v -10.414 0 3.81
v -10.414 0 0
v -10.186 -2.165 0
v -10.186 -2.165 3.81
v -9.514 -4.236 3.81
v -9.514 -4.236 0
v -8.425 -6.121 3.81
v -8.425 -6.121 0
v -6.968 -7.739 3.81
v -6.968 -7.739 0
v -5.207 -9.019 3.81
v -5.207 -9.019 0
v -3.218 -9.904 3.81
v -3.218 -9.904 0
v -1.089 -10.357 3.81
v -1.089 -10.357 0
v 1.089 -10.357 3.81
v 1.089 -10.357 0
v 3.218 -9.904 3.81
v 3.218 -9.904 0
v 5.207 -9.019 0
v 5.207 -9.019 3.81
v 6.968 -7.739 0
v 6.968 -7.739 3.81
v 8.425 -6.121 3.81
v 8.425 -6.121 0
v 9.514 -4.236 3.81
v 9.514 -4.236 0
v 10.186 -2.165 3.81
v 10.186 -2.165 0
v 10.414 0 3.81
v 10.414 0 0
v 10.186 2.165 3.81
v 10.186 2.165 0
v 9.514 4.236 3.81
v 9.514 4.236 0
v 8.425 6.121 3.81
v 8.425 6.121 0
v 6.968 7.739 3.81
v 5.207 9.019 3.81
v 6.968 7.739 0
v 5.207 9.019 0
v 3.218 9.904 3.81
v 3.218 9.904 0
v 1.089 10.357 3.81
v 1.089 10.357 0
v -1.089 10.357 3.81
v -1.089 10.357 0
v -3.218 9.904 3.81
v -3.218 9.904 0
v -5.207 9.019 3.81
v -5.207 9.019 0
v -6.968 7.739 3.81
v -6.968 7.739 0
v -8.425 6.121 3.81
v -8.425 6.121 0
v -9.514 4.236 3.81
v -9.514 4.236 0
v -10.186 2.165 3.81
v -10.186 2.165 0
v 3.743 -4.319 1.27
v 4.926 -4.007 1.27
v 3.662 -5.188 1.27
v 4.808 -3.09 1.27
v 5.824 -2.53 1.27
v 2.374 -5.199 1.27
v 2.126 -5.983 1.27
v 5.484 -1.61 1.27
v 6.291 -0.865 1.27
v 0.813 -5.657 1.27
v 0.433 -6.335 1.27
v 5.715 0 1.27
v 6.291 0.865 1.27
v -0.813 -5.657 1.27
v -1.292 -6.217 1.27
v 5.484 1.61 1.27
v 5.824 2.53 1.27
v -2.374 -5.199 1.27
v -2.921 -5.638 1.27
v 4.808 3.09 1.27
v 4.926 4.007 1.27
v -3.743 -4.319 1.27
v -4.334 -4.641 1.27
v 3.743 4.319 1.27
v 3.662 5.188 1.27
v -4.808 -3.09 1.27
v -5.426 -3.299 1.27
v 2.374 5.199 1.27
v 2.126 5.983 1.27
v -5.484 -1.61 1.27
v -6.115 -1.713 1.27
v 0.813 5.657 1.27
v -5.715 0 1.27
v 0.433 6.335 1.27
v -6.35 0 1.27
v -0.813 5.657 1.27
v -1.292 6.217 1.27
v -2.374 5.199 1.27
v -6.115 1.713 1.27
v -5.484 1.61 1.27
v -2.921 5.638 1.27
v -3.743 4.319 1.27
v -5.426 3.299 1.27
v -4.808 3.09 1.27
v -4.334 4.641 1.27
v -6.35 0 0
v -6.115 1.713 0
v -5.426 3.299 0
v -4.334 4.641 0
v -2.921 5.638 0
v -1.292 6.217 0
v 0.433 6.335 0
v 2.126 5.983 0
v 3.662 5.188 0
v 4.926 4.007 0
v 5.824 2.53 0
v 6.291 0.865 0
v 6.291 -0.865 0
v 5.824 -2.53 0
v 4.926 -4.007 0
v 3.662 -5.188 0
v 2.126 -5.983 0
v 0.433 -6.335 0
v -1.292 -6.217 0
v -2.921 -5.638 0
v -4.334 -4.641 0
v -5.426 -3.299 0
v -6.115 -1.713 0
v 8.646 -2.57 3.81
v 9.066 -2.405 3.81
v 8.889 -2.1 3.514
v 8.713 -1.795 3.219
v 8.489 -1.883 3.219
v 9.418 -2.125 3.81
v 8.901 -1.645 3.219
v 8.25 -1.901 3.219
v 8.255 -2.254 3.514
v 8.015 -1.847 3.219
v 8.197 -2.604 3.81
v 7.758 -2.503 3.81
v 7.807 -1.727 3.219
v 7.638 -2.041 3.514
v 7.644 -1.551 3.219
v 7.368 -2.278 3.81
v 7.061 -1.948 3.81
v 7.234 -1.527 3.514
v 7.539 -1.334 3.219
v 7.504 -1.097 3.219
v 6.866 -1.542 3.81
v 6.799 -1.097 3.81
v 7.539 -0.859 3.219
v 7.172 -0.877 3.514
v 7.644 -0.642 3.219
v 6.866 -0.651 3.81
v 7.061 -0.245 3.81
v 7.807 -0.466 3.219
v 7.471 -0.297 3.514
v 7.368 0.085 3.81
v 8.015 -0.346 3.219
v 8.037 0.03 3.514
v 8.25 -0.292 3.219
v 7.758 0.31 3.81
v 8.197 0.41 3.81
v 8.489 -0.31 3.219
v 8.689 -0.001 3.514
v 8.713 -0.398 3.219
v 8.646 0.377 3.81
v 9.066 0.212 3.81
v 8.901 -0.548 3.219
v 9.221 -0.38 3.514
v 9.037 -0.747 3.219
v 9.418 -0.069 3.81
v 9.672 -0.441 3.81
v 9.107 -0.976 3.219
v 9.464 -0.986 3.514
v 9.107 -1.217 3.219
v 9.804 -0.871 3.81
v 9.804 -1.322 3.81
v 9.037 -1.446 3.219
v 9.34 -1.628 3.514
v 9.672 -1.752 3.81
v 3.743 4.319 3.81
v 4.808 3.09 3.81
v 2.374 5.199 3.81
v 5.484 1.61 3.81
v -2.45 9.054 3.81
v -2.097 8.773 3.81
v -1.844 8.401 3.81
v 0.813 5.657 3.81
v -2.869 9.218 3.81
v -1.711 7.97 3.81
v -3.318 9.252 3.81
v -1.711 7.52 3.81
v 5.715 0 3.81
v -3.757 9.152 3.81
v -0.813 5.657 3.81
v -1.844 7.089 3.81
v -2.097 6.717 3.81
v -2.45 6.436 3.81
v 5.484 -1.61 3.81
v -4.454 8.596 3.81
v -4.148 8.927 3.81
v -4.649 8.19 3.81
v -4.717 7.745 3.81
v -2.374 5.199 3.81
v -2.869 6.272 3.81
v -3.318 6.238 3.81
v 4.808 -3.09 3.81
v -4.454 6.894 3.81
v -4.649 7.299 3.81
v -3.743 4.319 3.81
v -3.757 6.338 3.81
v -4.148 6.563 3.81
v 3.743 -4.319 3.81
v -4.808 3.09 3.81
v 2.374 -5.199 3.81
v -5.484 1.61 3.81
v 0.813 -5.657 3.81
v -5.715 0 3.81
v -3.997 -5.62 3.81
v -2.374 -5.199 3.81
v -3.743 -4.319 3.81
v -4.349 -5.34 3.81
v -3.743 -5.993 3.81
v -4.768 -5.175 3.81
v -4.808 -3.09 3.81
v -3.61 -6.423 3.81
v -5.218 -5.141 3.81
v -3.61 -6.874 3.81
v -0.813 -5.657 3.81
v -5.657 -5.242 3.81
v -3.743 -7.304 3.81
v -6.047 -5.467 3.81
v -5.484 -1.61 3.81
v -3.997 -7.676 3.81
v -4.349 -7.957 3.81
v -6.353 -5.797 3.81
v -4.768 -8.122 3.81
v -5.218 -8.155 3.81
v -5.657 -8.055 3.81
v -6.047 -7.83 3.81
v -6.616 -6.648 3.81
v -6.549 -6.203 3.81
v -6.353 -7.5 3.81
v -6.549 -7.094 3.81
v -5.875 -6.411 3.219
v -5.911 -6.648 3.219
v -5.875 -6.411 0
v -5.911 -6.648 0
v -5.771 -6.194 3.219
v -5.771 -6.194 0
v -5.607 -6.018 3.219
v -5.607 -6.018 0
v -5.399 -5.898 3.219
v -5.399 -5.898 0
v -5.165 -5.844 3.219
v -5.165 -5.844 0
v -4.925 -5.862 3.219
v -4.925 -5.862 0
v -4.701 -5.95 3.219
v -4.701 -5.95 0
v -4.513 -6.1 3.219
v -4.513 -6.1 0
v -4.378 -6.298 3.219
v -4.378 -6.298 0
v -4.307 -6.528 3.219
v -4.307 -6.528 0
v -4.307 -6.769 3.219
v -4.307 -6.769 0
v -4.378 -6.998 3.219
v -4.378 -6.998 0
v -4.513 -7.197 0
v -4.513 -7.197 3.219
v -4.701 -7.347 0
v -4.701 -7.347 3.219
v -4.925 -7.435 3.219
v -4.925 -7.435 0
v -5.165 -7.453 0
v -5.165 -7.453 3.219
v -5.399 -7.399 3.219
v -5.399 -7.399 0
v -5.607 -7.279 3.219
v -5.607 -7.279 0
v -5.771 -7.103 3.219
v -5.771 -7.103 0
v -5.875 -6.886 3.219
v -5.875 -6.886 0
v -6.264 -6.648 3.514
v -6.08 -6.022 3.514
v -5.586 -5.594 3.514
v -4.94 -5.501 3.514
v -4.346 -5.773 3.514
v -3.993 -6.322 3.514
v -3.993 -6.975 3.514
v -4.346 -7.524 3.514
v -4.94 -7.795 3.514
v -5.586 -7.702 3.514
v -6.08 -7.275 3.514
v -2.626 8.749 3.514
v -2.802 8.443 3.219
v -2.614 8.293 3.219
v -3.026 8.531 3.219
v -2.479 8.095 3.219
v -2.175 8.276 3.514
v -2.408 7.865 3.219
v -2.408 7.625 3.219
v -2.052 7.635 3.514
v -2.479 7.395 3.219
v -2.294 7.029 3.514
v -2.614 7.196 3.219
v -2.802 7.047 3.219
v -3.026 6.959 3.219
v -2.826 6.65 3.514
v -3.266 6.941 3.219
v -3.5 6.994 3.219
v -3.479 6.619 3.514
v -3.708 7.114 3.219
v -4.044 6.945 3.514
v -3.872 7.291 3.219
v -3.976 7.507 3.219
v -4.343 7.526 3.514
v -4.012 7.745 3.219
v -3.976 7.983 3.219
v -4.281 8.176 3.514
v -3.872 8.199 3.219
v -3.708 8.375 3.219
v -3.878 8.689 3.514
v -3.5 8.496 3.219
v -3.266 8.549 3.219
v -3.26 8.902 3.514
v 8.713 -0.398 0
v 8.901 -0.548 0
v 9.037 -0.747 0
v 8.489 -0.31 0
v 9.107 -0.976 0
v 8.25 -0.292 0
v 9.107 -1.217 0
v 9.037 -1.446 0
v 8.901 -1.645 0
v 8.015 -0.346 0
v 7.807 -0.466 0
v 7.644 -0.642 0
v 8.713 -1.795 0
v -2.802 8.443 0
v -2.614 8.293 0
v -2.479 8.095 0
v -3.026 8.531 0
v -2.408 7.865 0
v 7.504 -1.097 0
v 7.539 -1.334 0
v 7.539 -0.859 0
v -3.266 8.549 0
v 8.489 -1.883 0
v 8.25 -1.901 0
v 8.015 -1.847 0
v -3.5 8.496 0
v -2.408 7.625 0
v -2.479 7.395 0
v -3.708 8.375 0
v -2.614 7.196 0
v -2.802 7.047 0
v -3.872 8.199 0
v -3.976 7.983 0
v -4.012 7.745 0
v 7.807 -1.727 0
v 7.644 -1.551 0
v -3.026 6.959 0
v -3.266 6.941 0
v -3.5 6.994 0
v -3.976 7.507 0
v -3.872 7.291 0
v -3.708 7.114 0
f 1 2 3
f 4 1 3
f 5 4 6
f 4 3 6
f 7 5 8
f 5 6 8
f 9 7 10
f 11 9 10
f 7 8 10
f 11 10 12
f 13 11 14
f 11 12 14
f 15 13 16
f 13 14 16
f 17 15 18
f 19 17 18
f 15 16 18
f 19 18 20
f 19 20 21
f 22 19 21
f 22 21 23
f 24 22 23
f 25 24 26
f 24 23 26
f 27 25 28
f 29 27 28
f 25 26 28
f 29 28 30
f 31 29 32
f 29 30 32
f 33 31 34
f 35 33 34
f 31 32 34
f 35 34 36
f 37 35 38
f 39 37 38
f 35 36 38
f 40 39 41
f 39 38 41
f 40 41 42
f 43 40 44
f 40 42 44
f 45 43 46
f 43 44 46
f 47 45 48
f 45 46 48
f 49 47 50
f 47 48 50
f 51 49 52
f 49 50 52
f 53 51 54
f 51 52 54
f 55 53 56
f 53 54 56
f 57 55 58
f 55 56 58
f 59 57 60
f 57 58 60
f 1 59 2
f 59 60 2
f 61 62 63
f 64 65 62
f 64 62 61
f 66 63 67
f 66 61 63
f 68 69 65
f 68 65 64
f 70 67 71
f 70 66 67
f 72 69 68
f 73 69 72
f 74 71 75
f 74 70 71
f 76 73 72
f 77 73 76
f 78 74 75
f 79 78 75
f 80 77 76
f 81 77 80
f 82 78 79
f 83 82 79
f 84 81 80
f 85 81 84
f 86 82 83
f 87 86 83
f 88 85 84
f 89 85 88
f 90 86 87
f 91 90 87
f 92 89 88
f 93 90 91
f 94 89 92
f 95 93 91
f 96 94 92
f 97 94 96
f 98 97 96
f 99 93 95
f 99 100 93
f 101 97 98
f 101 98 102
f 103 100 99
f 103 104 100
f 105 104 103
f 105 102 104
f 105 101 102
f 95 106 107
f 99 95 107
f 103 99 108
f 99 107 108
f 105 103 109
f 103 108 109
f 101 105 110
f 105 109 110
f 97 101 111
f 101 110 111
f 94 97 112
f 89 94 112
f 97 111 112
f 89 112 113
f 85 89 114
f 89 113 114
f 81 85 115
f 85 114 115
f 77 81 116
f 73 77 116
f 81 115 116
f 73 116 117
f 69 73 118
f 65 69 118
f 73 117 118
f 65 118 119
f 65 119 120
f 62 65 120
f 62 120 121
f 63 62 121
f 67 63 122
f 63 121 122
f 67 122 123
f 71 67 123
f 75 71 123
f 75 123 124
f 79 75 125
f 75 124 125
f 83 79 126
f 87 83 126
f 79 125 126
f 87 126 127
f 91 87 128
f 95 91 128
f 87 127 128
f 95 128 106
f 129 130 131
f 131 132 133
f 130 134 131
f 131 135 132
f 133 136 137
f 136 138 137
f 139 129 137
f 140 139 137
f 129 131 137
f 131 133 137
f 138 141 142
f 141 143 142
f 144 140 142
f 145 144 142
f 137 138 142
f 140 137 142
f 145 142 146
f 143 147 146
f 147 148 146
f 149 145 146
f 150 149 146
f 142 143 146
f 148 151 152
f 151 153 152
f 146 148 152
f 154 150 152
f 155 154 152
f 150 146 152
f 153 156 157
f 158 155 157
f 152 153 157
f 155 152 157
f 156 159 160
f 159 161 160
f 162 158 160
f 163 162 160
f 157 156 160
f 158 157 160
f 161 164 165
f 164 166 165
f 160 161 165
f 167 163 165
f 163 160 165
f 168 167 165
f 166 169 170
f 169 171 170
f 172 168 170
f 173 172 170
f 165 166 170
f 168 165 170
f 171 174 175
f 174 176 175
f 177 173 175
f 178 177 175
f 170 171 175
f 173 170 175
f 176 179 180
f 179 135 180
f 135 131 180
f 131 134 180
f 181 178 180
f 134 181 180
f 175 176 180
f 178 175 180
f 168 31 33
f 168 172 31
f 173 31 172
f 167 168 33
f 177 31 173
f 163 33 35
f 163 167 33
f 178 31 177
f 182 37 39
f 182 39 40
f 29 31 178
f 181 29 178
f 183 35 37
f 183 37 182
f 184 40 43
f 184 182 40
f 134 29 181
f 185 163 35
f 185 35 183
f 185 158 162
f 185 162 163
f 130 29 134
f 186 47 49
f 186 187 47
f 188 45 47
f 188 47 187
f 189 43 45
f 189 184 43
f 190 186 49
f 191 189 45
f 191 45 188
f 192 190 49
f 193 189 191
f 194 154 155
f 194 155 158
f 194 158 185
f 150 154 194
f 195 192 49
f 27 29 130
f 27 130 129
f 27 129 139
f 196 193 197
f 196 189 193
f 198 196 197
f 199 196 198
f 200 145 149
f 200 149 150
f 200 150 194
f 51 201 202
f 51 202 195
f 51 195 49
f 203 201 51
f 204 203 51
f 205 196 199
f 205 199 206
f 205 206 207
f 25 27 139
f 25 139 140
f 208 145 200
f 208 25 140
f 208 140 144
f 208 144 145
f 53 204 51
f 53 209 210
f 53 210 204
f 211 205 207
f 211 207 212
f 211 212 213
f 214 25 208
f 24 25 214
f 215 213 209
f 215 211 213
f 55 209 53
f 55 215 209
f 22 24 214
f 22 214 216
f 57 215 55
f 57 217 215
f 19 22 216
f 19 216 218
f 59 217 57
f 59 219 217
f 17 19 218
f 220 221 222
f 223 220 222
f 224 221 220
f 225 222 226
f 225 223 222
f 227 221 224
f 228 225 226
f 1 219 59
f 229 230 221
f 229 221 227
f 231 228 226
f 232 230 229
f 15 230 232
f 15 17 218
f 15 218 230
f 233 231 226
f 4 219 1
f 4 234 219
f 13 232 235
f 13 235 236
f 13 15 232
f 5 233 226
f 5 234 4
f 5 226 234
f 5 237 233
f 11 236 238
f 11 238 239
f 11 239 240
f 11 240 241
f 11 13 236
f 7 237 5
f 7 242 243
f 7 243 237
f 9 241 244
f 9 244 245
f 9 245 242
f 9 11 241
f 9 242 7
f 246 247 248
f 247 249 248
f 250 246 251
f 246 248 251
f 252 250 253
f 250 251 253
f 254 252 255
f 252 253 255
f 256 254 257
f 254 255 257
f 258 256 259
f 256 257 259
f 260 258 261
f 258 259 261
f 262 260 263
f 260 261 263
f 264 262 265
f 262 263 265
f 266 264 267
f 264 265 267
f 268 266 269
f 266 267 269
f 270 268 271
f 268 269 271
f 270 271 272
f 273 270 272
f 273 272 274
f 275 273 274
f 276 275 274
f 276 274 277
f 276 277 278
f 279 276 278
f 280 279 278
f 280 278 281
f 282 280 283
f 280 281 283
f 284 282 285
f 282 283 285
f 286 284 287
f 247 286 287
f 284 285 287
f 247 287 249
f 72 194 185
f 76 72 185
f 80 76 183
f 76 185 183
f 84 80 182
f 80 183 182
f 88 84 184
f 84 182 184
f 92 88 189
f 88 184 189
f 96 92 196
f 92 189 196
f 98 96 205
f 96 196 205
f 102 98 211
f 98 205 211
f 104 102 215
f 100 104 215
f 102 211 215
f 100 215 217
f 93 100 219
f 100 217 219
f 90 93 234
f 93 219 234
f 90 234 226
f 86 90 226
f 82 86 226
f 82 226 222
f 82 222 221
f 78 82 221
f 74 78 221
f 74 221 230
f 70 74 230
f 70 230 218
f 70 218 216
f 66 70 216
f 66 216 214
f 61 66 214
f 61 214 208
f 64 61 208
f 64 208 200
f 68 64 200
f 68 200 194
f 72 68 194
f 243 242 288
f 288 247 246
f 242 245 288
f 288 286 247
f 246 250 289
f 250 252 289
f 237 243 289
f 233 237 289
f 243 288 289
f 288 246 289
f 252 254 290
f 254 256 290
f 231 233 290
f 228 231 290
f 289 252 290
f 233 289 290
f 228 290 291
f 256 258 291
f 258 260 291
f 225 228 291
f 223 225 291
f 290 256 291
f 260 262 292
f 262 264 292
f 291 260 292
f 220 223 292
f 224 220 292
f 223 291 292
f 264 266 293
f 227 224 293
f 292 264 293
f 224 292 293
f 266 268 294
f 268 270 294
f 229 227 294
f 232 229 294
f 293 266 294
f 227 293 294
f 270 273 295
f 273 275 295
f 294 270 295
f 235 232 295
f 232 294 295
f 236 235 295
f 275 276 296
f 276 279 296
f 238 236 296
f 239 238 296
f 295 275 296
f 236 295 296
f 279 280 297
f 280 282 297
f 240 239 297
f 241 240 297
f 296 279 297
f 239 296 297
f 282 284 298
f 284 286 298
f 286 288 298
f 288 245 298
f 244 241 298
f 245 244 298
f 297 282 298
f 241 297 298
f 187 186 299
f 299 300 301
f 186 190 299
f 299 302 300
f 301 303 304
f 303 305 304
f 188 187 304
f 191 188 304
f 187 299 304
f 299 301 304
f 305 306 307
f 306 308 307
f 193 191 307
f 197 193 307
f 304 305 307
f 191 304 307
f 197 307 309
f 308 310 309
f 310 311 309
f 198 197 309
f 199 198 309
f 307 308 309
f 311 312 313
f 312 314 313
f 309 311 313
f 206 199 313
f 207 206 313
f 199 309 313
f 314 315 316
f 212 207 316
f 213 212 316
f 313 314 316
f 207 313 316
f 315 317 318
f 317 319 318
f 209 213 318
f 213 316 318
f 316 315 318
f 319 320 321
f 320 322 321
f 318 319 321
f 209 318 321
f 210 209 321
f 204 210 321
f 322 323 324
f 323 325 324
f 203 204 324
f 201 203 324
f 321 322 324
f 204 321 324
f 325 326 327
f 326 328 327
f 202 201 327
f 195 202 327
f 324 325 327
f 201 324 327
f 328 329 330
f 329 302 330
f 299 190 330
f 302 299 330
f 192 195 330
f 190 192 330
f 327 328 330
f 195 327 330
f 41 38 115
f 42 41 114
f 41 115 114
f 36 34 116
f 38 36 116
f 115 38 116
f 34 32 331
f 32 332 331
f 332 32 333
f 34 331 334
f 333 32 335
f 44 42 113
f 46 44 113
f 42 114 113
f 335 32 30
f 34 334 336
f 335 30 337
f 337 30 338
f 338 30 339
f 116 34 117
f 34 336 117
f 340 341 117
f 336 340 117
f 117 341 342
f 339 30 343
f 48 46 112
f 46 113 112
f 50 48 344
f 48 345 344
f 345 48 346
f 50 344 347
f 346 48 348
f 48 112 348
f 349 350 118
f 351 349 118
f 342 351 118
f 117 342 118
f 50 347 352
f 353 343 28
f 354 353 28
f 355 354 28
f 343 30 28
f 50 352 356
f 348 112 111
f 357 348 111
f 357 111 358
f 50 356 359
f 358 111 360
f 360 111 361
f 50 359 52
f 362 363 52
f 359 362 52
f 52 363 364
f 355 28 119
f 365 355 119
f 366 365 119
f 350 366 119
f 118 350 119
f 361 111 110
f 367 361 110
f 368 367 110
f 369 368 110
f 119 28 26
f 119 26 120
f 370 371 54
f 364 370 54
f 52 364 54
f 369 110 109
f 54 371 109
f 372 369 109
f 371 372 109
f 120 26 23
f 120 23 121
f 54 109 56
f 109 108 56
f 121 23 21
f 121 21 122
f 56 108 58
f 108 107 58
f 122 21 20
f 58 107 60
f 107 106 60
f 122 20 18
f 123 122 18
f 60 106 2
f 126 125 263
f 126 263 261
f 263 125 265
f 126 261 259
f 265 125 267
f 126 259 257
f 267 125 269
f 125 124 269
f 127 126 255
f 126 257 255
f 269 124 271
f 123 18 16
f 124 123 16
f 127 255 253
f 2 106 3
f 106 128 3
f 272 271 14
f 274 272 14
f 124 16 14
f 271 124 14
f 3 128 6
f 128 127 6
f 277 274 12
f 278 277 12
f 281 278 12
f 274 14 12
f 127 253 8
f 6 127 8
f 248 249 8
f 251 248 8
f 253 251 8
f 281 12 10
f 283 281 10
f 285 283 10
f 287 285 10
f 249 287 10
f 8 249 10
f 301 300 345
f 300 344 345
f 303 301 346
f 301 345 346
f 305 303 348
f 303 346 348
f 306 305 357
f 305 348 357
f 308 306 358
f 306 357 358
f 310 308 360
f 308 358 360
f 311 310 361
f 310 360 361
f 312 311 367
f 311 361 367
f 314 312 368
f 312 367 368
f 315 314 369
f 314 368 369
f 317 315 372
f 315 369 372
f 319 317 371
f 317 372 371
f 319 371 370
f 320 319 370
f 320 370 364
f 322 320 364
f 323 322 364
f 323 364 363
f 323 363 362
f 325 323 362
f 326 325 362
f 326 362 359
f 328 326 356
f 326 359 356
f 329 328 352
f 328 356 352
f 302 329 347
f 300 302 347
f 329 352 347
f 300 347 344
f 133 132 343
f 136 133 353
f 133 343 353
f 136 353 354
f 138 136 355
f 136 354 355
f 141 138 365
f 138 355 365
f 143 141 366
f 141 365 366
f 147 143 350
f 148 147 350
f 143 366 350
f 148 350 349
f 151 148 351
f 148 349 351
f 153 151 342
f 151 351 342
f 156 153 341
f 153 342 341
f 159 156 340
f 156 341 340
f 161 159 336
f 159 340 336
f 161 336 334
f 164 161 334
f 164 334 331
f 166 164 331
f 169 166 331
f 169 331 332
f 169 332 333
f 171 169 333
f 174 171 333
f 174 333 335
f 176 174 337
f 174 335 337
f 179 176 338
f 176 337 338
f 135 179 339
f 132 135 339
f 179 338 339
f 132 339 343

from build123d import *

# Parameters (mm, degrees)
SKETCH1_R                                         = 10.414
BOSS_EXTRUDE1_DEPTH                               = 3.81
SKETCH2_R                                         = 5.715
CUT_EXTRUDE1_DEPTH                                = 16.212458447
SKETCH3_R                                         = 6.35
CUT_EXTRUDE3_DEPTH                                = 1.27
CSK_FOR_0_FLAT_HEAD_MACHINE_SCREW_100_D           = 1.6129
CSK_FOR_0_FLAT_HEAD_MACHINE_SCREW_100_CSINK_D     = 3.0226
CSK_FOR_0_FLAT_HEAD_MACHINE_SCREW_100_CSINK_ANGLE = 100
CIRPATTERN1_COUNT                                 = 3


with BuildPart() as part:
    # Sketch1 → Boss-Extrude1 (new body)
    with BuildSketch(Plane.XY):
        with Locations(Location((0, 0, 0), (0, 0, 180))):
            Circle(SKETCH1_R)
    extrude(amount=BOSS_EXTRUDE1_DEPTH)

    # Sketch2 → Cut-Extrude1 (cut, through all)
    with BuildSketch(Plane.XY.offset(3.81)):
        Circle(SKETCH2_R)
    extrude(amount=-CUT_EXTRUDE1_DEPTH, mode=Mode.SUBTRACT)

    # Sketch3 → Cut-Extrude3 (cut)
    with BuildSketch(Plane(origin=(0, 0, 0), x_dir=(-1, 0, 0), z_dir=(0, 0, -1))):
        Circle(SKETCH3_R)
    extrude(amount=-CUT_EXTRUDE3_DEPTH, mode=Mode.SUBTRACT)

    # CSK for #0 Flat Head Machine Screw (100)1 (through all)
    with Locations(Plane.XY.offset(3.81)):
        with Locations((-5.104644358, -6.648347913)):
            csk_for_0_flat_head_machine_screw_100 = CounterSinkHole(CSK_FOR_0_FLAT_HEAD_MACHINE_SCREW_100_D / 2, CSK_FOR_0_FLAT_HEAD_MACHINE_SCREW_100_CSINK_D / 2, counter_sink_angle=CSK_FOR_0_FLAT_HEAD_MACHINE_SCREW_100_CSINK_ANGLE)

    # CirPattern1: CSK for #0 Flat Head Machine Screw (100)1 ×3 about axis
    cirpattern1_axis = Axis((0, 0, 0), (0, 0, 1))
    for i in range(1, CIRPATTERN1_COUNT):
        add(csk_for_0_flat_head_machine_screw_100.rotate(cirpattern1_axis, i * 360 / CIRPATTERN1_COUNT), mode=Mode.SUBTRACT)


solid = part.part
